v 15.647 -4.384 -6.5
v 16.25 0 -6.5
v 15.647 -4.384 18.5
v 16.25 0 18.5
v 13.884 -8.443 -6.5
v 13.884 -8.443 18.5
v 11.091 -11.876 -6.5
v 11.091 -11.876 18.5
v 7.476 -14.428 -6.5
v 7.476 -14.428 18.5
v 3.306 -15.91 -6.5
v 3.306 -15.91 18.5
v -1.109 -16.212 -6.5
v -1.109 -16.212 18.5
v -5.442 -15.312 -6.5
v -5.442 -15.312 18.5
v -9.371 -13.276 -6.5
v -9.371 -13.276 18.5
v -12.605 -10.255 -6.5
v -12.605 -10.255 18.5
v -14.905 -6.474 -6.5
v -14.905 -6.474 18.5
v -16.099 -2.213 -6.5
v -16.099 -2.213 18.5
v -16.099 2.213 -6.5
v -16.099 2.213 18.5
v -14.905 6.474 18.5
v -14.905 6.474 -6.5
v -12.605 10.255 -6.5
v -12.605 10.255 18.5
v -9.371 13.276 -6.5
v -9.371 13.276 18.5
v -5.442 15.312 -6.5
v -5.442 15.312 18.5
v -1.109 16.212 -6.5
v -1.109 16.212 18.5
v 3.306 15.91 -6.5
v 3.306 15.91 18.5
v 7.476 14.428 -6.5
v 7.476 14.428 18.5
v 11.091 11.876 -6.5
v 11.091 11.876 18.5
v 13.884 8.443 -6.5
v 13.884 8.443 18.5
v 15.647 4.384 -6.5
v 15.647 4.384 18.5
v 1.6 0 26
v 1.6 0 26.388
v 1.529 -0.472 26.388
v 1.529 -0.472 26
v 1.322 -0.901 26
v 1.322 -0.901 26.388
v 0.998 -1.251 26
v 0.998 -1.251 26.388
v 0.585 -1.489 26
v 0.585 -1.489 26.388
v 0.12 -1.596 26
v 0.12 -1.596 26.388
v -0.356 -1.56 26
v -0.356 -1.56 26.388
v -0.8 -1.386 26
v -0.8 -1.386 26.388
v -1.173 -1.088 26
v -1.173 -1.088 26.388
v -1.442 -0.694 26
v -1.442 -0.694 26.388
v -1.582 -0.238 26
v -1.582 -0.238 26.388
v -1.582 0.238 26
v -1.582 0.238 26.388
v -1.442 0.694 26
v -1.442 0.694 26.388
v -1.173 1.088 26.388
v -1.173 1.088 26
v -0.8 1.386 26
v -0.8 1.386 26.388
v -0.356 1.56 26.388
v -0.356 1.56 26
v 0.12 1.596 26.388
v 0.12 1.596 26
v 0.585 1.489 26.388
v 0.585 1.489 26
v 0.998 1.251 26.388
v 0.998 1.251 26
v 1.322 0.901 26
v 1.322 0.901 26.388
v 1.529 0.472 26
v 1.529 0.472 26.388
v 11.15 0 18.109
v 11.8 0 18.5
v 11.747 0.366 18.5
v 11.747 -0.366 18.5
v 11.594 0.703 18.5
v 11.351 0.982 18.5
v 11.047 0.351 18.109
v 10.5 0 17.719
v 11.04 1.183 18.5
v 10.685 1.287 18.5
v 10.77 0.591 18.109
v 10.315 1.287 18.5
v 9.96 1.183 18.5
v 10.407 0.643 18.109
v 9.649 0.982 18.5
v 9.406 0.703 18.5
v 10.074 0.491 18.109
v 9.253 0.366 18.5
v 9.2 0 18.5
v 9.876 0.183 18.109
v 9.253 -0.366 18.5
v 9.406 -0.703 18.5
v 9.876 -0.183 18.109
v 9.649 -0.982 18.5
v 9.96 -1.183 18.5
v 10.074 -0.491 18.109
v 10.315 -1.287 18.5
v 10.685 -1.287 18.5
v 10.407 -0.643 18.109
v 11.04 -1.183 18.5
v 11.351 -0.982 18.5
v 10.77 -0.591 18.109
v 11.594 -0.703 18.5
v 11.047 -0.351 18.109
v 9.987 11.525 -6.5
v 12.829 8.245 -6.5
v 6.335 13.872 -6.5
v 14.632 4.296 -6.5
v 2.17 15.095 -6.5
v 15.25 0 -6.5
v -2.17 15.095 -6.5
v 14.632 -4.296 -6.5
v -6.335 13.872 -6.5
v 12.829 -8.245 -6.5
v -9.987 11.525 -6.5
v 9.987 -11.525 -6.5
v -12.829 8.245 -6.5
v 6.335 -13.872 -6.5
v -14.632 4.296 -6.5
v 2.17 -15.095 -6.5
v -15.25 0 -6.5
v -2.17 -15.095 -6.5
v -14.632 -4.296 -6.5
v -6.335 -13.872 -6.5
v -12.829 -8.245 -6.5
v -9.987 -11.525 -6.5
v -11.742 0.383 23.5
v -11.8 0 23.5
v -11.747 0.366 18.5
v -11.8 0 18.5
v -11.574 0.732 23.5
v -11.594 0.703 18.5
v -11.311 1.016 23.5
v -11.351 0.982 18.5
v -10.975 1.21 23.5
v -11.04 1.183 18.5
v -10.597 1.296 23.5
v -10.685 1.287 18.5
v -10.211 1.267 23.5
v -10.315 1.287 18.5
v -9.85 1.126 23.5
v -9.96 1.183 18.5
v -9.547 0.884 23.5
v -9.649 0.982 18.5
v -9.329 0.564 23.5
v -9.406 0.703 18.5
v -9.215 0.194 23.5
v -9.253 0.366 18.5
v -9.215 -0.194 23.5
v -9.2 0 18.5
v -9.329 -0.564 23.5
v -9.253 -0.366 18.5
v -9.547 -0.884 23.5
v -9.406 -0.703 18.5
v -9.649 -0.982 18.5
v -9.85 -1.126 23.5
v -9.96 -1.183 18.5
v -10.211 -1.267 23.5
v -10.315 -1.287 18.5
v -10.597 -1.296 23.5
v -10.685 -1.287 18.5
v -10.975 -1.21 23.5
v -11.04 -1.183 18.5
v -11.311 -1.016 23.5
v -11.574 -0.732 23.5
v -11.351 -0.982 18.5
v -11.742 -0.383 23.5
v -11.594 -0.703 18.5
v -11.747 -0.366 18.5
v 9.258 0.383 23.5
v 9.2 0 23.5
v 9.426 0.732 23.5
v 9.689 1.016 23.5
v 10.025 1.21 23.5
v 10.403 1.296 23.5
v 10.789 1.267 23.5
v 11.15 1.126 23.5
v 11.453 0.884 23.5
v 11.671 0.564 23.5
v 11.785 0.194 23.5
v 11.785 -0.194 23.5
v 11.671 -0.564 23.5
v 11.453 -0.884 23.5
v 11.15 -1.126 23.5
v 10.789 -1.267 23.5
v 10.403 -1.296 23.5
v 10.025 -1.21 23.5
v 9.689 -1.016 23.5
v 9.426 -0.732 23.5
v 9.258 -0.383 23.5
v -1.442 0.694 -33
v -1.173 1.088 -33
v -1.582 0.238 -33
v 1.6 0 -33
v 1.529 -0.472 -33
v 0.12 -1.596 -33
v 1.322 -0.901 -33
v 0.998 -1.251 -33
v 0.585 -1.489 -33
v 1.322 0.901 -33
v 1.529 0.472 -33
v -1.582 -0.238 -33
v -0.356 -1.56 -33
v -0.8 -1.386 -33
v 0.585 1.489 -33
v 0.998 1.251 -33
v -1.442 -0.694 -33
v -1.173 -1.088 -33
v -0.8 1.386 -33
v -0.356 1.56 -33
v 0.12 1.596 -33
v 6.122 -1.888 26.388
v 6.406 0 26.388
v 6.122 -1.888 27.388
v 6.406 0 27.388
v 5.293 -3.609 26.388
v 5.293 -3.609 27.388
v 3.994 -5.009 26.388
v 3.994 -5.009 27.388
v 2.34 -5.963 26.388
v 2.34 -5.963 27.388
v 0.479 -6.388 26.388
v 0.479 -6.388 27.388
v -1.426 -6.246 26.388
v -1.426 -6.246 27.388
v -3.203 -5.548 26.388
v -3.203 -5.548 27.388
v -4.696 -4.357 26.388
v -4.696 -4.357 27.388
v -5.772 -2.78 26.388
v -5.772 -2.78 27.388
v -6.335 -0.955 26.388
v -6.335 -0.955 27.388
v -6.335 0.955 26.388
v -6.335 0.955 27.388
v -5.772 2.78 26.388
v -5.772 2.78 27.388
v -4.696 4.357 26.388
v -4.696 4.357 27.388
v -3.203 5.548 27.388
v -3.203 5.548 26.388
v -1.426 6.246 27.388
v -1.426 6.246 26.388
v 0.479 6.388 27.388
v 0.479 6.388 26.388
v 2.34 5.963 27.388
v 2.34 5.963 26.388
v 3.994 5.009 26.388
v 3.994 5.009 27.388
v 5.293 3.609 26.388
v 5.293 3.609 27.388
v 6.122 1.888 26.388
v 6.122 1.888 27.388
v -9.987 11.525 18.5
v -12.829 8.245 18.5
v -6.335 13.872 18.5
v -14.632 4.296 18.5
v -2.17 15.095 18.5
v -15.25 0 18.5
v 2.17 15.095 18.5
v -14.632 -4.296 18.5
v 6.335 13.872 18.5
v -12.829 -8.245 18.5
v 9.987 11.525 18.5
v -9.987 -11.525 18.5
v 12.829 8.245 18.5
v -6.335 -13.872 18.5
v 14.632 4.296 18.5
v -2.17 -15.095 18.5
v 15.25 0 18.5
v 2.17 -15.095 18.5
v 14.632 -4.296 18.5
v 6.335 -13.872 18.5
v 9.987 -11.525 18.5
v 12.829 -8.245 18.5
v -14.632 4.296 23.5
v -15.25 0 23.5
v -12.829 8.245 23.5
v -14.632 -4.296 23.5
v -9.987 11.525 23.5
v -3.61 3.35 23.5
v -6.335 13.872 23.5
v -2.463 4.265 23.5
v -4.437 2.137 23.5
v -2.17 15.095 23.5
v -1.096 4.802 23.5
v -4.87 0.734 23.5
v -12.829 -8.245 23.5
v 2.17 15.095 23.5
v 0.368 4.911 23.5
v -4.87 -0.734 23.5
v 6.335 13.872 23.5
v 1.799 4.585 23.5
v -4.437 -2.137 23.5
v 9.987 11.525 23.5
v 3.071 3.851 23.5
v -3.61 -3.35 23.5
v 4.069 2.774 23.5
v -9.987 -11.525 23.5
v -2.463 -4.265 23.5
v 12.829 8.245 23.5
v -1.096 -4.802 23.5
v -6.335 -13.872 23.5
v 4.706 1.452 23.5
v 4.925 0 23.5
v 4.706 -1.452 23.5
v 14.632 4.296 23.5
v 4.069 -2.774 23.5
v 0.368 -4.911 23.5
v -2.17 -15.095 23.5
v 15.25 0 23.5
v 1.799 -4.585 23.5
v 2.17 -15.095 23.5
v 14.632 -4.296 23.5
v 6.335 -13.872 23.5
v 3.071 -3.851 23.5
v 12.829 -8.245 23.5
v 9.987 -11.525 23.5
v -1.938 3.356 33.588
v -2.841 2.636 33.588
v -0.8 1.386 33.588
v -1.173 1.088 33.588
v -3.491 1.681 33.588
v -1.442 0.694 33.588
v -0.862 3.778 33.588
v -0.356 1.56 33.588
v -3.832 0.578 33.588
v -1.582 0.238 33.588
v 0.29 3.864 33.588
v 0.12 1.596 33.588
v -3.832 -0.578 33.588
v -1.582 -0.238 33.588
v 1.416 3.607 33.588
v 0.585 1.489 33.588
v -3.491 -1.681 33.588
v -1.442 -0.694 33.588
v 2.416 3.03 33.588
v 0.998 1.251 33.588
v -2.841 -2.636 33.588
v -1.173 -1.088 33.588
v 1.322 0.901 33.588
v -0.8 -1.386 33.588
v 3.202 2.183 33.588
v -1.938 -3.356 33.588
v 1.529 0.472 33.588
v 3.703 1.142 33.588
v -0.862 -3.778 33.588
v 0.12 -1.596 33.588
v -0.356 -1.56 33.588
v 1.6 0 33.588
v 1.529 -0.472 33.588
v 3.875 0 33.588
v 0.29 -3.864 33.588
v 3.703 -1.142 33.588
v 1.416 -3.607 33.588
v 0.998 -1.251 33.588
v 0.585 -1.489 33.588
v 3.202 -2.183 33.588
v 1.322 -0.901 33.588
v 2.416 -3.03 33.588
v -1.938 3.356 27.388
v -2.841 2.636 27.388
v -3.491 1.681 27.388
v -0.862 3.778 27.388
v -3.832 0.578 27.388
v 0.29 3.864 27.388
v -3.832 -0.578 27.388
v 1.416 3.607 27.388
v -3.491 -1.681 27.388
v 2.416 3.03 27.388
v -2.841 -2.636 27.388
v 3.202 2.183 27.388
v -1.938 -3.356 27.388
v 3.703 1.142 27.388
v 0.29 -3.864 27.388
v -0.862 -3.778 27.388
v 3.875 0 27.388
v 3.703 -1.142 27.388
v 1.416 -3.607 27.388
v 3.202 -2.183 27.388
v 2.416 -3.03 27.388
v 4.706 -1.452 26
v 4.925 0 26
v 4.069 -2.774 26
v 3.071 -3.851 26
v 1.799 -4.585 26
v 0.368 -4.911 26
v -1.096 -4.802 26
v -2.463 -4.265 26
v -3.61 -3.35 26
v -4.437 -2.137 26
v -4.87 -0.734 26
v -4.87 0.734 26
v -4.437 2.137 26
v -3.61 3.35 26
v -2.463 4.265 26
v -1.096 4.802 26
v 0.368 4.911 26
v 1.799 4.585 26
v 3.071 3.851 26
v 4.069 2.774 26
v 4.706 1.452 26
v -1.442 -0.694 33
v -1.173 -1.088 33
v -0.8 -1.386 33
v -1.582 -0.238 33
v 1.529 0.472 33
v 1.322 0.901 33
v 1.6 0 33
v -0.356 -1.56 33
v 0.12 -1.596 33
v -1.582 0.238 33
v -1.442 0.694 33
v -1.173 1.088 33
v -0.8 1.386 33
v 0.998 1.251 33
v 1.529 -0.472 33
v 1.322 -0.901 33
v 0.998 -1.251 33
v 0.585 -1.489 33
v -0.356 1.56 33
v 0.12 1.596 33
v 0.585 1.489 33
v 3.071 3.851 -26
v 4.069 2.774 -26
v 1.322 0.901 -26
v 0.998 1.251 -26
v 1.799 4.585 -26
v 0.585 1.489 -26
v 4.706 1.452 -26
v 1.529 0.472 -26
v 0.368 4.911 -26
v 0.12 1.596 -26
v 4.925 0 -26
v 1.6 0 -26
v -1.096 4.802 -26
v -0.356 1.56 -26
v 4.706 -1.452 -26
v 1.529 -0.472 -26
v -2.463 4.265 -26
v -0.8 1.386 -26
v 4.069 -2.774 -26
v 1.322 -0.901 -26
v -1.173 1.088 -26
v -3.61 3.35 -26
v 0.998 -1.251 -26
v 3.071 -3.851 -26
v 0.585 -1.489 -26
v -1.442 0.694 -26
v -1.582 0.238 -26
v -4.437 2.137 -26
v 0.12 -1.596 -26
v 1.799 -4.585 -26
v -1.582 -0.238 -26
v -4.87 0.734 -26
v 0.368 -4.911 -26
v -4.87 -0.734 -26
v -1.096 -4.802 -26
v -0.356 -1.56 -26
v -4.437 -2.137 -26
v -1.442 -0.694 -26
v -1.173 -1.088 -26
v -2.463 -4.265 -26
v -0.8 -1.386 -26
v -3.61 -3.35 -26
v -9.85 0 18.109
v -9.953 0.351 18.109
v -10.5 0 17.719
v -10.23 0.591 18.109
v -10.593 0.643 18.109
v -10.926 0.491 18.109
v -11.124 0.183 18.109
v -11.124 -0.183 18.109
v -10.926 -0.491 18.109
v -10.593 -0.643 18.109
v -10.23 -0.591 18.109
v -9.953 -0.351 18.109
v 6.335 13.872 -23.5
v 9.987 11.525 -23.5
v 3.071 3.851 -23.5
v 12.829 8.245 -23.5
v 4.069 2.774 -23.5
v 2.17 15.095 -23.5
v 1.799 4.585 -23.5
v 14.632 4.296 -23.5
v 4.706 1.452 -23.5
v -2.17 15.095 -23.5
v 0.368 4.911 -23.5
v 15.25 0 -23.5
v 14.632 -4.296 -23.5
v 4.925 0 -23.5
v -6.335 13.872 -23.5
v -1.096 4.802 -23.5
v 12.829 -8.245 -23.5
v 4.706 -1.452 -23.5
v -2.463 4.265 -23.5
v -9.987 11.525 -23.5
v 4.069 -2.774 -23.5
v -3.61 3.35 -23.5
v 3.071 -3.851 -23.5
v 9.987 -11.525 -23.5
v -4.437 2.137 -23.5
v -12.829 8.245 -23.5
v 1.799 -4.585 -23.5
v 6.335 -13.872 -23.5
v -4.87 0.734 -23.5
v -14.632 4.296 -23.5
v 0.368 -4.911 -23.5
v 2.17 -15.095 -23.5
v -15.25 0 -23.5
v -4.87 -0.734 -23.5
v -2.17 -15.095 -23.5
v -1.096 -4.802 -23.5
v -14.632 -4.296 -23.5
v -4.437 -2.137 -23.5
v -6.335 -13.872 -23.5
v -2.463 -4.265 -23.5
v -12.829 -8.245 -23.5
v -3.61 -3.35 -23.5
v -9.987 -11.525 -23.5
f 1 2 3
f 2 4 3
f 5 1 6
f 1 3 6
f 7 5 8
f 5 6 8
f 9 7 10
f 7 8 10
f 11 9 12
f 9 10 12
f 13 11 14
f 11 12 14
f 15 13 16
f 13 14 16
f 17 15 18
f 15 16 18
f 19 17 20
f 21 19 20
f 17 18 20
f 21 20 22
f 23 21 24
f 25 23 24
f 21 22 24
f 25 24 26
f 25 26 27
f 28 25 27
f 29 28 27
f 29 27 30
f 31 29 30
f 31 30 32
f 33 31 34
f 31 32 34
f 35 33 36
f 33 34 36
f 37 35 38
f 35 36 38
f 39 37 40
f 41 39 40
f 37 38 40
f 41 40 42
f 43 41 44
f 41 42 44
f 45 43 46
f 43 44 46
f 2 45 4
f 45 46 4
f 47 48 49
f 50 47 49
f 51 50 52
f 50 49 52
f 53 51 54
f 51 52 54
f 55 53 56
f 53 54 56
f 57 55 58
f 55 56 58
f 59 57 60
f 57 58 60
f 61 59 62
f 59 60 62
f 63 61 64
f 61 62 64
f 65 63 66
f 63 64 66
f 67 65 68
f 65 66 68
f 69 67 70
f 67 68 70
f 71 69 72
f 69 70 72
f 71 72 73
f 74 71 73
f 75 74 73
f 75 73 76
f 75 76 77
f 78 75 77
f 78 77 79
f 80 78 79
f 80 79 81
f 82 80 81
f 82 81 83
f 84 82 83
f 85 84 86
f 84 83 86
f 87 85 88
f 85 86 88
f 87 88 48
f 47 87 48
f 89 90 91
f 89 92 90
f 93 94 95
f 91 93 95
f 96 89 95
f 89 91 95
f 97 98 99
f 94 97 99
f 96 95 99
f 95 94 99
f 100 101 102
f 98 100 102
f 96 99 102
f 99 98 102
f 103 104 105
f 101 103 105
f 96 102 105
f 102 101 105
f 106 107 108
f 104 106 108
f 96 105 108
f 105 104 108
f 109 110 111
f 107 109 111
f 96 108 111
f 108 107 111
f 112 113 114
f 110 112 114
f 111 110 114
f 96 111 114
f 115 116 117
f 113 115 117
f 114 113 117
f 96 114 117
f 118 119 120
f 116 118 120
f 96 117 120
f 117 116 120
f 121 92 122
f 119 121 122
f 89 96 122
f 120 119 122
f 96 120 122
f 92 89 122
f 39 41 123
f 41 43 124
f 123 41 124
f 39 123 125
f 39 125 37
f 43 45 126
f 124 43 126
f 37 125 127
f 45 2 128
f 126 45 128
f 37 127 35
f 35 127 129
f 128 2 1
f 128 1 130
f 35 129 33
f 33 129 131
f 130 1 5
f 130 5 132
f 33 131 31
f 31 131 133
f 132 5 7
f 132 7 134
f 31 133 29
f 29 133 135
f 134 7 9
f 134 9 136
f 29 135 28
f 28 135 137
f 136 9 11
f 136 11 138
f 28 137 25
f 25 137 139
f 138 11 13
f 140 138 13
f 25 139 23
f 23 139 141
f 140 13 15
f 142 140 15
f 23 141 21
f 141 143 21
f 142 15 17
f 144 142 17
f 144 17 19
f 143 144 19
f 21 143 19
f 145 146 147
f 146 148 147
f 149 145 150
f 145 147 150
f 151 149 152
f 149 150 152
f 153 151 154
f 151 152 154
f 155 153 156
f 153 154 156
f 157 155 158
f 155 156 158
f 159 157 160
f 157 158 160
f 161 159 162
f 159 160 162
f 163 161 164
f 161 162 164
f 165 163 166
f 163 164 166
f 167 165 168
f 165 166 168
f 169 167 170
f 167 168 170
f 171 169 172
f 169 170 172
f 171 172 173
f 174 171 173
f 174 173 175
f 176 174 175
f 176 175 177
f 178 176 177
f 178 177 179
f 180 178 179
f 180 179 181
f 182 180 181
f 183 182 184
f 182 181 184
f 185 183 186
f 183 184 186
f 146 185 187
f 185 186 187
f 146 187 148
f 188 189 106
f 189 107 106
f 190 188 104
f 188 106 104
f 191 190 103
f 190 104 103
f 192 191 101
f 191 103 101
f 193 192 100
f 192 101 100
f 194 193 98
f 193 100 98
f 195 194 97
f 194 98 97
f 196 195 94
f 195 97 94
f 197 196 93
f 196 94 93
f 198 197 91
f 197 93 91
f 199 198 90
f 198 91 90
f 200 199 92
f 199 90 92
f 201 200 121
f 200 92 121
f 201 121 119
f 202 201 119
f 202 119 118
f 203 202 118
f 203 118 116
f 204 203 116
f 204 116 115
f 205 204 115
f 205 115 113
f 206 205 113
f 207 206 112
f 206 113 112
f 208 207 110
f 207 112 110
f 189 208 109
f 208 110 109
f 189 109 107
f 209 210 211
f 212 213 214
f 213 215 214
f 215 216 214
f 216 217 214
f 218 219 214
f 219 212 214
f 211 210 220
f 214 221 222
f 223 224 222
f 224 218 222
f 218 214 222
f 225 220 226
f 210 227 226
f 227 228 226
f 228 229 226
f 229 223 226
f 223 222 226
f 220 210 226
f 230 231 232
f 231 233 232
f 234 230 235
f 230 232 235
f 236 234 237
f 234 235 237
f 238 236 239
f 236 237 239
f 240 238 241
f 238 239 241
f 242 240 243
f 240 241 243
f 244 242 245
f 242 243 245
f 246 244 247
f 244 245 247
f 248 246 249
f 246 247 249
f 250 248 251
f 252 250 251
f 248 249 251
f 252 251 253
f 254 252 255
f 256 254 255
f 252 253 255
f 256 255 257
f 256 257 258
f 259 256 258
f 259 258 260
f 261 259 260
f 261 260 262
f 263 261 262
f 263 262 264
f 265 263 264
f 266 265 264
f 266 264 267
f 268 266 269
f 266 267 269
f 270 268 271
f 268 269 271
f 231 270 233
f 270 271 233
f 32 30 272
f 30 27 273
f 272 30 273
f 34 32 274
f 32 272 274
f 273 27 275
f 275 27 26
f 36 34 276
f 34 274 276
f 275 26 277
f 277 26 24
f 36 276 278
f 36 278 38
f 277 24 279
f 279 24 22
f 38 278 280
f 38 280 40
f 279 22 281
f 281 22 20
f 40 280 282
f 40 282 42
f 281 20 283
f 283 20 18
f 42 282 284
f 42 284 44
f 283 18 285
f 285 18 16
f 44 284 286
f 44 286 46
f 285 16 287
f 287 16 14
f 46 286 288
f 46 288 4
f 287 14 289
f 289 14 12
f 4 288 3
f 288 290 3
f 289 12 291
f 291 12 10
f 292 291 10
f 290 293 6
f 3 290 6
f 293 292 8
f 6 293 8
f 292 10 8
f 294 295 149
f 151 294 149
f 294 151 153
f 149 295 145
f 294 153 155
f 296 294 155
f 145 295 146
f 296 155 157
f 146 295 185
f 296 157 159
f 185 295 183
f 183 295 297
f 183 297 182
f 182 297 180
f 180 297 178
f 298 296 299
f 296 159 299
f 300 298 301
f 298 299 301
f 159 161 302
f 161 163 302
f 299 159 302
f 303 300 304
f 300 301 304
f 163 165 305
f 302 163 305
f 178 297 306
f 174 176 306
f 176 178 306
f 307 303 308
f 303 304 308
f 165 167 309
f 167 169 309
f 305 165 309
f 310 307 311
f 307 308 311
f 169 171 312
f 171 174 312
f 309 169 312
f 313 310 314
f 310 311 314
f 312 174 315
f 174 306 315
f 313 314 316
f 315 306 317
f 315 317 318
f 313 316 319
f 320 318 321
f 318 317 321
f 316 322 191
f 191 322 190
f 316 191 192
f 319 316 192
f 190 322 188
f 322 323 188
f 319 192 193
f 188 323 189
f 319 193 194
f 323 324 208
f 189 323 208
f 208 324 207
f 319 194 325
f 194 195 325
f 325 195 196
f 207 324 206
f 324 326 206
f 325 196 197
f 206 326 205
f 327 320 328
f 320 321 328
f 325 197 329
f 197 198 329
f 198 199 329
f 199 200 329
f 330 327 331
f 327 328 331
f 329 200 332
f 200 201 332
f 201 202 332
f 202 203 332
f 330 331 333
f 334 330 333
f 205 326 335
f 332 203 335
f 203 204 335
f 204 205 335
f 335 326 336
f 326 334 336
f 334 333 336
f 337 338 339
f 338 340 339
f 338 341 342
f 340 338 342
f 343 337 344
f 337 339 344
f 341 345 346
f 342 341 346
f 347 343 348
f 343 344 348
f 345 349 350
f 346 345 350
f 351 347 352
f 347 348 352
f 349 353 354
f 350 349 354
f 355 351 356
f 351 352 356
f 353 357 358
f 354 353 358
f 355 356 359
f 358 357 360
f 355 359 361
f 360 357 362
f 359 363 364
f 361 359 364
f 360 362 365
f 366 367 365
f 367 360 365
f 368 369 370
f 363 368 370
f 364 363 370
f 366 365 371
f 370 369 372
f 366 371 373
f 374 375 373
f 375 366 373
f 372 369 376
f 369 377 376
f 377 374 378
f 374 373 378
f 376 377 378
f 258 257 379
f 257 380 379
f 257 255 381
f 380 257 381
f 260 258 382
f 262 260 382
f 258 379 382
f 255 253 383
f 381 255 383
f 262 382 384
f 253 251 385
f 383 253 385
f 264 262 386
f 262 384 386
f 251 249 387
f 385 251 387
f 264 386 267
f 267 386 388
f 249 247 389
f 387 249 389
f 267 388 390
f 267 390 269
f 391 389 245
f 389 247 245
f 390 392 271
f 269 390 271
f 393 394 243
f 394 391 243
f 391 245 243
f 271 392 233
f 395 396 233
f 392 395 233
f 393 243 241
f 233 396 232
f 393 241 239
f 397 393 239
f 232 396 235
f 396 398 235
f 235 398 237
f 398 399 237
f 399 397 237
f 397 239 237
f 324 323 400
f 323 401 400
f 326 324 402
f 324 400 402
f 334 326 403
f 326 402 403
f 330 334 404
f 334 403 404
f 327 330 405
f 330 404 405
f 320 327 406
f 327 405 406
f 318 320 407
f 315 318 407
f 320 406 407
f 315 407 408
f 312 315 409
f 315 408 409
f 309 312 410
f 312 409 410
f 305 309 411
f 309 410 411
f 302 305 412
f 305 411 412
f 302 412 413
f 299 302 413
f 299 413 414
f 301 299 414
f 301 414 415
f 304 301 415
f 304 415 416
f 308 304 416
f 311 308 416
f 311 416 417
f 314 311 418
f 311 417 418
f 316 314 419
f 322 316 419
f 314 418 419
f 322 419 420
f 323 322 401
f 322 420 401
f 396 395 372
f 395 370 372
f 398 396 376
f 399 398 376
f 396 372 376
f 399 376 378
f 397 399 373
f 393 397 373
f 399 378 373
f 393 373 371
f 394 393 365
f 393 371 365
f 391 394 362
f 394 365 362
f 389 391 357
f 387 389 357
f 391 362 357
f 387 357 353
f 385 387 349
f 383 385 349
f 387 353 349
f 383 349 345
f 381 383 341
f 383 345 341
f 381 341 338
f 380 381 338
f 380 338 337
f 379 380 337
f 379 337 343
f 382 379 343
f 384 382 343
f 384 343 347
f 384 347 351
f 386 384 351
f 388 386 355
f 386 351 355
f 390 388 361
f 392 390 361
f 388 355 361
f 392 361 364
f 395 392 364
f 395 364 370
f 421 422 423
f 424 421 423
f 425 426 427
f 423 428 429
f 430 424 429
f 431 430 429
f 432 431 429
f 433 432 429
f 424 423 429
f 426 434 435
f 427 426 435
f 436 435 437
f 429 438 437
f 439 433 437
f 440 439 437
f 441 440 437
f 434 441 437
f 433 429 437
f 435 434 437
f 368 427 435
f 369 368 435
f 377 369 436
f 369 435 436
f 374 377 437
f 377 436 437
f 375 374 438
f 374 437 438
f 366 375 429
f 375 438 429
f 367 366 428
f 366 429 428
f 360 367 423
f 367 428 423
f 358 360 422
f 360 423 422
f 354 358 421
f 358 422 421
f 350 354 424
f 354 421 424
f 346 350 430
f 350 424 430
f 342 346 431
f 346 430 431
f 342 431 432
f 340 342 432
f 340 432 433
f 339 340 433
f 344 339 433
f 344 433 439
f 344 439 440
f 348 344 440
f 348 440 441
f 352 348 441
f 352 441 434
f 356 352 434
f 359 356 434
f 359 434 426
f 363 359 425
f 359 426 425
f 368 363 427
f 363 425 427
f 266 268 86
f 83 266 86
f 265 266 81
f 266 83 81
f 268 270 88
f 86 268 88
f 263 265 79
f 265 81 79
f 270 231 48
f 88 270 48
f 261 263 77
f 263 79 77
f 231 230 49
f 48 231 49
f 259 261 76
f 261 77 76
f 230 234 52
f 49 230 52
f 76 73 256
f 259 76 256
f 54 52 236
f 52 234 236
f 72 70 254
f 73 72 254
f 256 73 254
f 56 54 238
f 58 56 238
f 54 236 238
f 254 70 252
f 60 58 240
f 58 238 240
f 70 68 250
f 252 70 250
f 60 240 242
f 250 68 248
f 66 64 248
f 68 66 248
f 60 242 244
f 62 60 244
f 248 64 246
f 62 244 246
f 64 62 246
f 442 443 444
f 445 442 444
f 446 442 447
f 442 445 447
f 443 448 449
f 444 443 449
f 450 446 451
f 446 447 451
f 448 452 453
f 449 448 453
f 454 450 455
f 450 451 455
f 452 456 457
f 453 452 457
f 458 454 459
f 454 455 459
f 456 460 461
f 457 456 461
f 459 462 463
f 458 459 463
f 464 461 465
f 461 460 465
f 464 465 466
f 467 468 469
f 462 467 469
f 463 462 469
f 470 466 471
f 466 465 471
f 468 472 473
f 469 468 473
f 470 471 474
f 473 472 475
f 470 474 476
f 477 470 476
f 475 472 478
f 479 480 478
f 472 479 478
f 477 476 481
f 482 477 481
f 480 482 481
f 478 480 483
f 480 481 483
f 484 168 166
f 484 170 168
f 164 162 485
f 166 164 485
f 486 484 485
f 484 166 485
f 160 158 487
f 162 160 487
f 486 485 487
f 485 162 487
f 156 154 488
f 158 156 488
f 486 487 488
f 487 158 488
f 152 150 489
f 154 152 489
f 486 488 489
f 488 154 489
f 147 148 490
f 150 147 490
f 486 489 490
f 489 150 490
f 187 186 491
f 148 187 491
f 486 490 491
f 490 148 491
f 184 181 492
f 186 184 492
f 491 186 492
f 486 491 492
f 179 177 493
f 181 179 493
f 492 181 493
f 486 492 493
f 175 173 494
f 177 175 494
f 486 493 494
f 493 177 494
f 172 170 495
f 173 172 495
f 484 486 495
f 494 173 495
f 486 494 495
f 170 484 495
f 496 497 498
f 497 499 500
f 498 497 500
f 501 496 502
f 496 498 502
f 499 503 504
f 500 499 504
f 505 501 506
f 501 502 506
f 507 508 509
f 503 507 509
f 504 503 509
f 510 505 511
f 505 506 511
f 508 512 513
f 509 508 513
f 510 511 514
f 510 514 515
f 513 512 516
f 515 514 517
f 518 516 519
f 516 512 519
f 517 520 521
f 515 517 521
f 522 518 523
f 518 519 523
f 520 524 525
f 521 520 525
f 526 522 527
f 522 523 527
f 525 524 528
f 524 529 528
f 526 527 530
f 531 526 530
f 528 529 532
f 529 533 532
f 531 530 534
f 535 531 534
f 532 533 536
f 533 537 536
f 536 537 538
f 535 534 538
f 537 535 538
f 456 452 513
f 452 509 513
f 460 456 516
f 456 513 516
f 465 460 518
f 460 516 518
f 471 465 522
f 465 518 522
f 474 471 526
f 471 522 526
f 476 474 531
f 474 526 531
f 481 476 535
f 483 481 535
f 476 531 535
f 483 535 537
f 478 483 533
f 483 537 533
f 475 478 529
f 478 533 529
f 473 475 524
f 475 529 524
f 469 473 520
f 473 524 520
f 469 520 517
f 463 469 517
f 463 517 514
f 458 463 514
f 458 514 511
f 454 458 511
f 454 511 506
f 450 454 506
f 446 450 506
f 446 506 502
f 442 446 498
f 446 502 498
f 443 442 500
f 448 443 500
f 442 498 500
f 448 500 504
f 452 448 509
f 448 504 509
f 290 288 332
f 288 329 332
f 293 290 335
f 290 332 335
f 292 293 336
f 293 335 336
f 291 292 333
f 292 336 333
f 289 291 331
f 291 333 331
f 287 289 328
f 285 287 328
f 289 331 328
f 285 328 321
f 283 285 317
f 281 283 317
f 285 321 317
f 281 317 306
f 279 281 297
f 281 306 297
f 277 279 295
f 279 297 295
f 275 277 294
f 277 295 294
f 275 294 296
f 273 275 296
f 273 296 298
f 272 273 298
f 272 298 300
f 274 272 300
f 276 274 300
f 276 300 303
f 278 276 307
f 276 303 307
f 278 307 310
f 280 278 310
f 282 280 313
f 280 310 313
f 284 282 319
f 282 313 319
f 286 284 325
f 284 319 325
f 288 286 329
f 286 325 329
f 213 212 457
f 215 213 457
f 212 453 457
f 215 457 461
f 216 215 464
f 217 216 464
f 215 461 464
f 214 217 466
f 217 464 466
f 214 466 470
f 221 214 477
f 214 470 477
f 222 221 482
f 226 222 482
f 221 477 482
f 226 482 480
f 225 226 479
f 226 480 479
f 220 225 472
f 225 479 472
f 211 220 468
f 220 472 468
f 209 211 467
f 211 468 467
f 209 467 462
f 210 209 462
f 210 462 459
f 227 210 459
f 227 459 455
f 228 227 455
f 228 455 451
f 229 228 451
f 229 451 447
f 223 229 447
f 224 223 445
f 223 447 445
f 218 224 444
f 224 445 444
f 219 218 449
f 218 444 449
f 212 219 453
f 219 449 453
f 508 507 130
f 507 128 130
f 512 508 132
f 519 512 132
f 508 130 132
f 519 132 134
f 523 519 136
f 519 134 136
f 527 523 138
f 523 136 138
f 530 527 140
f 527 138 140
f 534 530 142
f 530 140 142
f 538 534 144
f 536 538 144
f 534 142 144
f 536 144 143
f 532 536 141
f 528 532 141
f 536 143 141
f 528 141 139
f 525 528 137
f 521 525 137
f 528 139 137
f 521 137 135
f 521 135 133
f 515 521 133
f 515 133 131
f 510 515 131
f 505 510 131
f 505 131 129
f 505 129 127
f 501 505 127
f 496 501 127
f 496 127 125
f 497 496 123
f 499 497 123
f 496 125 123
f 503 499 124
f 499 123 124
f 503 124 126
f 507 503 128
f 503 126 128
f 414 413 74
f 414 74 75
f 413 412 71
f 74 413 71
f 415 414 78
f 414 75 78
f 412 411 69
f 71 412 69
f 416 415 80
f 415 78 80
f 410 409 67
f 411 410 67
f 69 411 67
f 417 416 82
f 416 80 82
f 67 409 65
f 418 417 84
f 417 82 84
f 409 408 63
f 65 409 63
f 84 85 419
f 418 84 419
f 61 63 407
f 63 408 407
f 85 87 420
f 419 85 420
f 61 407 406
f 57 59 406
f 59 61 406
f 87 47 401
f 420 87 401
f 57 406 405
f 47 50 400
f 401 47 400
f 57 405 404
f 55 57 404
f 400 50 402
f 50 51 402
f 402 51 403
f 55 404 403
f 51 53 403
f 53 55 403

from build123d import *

# Parameters (mm, degrees)
F3_D     = 2.6
F3_DEPTH = 5
F3_TIP   = 0.7811188047


with BuildPart() as f1:
    # F0 (on Front) → F1 (revolve)
    with BuildSketch(Plane.XZ):
        Polygon((1.6, 33), (0, 33), (0, -33), (1.6, -33), (1.6, -26), (4.925, -26), (4.925, -23.5), (15.25, -23.5), (15.25, -6.5), (16.25, -6.5), (16.25, 18.5), (15.25, 18.5), (15.25, 23.5), (4.925, 23.5), (4.925, 26), (1.6, 26), align=None)
    revolve(axis=Axis((0, 0, 0), (0, 0, -1)))

    # F3
    with Locations(Plane.XY.offset(23.5)):
        with Locations((-10.5, 0), (10.5, 0)):
            Hole(F3_D / 2, depth=F3_DEPTH)
            with Locations((0, 0, -(F3_DEPTH + F3_TIP / 2))):  # 118° drill point
                Cone(0, F3_D / 2, F3_TIP, mode=Mode.SUBTRACT)

    # F4 (on Front) → F5 (revolve)
    with BuildSketch(Plane.XZ):
        Polygon((3.875, 27.3875447527), (3.875, 33.5875447527), (1.6, 33.5875447527), (1.6, 26.3875447527), (6.4063321701, 26.3875447527), (6.4063321701, 27.3875447527), align=None)
    revolve(axis=Axis((0, 0, 0), (0, 0, -1)))


solid = f1.part
